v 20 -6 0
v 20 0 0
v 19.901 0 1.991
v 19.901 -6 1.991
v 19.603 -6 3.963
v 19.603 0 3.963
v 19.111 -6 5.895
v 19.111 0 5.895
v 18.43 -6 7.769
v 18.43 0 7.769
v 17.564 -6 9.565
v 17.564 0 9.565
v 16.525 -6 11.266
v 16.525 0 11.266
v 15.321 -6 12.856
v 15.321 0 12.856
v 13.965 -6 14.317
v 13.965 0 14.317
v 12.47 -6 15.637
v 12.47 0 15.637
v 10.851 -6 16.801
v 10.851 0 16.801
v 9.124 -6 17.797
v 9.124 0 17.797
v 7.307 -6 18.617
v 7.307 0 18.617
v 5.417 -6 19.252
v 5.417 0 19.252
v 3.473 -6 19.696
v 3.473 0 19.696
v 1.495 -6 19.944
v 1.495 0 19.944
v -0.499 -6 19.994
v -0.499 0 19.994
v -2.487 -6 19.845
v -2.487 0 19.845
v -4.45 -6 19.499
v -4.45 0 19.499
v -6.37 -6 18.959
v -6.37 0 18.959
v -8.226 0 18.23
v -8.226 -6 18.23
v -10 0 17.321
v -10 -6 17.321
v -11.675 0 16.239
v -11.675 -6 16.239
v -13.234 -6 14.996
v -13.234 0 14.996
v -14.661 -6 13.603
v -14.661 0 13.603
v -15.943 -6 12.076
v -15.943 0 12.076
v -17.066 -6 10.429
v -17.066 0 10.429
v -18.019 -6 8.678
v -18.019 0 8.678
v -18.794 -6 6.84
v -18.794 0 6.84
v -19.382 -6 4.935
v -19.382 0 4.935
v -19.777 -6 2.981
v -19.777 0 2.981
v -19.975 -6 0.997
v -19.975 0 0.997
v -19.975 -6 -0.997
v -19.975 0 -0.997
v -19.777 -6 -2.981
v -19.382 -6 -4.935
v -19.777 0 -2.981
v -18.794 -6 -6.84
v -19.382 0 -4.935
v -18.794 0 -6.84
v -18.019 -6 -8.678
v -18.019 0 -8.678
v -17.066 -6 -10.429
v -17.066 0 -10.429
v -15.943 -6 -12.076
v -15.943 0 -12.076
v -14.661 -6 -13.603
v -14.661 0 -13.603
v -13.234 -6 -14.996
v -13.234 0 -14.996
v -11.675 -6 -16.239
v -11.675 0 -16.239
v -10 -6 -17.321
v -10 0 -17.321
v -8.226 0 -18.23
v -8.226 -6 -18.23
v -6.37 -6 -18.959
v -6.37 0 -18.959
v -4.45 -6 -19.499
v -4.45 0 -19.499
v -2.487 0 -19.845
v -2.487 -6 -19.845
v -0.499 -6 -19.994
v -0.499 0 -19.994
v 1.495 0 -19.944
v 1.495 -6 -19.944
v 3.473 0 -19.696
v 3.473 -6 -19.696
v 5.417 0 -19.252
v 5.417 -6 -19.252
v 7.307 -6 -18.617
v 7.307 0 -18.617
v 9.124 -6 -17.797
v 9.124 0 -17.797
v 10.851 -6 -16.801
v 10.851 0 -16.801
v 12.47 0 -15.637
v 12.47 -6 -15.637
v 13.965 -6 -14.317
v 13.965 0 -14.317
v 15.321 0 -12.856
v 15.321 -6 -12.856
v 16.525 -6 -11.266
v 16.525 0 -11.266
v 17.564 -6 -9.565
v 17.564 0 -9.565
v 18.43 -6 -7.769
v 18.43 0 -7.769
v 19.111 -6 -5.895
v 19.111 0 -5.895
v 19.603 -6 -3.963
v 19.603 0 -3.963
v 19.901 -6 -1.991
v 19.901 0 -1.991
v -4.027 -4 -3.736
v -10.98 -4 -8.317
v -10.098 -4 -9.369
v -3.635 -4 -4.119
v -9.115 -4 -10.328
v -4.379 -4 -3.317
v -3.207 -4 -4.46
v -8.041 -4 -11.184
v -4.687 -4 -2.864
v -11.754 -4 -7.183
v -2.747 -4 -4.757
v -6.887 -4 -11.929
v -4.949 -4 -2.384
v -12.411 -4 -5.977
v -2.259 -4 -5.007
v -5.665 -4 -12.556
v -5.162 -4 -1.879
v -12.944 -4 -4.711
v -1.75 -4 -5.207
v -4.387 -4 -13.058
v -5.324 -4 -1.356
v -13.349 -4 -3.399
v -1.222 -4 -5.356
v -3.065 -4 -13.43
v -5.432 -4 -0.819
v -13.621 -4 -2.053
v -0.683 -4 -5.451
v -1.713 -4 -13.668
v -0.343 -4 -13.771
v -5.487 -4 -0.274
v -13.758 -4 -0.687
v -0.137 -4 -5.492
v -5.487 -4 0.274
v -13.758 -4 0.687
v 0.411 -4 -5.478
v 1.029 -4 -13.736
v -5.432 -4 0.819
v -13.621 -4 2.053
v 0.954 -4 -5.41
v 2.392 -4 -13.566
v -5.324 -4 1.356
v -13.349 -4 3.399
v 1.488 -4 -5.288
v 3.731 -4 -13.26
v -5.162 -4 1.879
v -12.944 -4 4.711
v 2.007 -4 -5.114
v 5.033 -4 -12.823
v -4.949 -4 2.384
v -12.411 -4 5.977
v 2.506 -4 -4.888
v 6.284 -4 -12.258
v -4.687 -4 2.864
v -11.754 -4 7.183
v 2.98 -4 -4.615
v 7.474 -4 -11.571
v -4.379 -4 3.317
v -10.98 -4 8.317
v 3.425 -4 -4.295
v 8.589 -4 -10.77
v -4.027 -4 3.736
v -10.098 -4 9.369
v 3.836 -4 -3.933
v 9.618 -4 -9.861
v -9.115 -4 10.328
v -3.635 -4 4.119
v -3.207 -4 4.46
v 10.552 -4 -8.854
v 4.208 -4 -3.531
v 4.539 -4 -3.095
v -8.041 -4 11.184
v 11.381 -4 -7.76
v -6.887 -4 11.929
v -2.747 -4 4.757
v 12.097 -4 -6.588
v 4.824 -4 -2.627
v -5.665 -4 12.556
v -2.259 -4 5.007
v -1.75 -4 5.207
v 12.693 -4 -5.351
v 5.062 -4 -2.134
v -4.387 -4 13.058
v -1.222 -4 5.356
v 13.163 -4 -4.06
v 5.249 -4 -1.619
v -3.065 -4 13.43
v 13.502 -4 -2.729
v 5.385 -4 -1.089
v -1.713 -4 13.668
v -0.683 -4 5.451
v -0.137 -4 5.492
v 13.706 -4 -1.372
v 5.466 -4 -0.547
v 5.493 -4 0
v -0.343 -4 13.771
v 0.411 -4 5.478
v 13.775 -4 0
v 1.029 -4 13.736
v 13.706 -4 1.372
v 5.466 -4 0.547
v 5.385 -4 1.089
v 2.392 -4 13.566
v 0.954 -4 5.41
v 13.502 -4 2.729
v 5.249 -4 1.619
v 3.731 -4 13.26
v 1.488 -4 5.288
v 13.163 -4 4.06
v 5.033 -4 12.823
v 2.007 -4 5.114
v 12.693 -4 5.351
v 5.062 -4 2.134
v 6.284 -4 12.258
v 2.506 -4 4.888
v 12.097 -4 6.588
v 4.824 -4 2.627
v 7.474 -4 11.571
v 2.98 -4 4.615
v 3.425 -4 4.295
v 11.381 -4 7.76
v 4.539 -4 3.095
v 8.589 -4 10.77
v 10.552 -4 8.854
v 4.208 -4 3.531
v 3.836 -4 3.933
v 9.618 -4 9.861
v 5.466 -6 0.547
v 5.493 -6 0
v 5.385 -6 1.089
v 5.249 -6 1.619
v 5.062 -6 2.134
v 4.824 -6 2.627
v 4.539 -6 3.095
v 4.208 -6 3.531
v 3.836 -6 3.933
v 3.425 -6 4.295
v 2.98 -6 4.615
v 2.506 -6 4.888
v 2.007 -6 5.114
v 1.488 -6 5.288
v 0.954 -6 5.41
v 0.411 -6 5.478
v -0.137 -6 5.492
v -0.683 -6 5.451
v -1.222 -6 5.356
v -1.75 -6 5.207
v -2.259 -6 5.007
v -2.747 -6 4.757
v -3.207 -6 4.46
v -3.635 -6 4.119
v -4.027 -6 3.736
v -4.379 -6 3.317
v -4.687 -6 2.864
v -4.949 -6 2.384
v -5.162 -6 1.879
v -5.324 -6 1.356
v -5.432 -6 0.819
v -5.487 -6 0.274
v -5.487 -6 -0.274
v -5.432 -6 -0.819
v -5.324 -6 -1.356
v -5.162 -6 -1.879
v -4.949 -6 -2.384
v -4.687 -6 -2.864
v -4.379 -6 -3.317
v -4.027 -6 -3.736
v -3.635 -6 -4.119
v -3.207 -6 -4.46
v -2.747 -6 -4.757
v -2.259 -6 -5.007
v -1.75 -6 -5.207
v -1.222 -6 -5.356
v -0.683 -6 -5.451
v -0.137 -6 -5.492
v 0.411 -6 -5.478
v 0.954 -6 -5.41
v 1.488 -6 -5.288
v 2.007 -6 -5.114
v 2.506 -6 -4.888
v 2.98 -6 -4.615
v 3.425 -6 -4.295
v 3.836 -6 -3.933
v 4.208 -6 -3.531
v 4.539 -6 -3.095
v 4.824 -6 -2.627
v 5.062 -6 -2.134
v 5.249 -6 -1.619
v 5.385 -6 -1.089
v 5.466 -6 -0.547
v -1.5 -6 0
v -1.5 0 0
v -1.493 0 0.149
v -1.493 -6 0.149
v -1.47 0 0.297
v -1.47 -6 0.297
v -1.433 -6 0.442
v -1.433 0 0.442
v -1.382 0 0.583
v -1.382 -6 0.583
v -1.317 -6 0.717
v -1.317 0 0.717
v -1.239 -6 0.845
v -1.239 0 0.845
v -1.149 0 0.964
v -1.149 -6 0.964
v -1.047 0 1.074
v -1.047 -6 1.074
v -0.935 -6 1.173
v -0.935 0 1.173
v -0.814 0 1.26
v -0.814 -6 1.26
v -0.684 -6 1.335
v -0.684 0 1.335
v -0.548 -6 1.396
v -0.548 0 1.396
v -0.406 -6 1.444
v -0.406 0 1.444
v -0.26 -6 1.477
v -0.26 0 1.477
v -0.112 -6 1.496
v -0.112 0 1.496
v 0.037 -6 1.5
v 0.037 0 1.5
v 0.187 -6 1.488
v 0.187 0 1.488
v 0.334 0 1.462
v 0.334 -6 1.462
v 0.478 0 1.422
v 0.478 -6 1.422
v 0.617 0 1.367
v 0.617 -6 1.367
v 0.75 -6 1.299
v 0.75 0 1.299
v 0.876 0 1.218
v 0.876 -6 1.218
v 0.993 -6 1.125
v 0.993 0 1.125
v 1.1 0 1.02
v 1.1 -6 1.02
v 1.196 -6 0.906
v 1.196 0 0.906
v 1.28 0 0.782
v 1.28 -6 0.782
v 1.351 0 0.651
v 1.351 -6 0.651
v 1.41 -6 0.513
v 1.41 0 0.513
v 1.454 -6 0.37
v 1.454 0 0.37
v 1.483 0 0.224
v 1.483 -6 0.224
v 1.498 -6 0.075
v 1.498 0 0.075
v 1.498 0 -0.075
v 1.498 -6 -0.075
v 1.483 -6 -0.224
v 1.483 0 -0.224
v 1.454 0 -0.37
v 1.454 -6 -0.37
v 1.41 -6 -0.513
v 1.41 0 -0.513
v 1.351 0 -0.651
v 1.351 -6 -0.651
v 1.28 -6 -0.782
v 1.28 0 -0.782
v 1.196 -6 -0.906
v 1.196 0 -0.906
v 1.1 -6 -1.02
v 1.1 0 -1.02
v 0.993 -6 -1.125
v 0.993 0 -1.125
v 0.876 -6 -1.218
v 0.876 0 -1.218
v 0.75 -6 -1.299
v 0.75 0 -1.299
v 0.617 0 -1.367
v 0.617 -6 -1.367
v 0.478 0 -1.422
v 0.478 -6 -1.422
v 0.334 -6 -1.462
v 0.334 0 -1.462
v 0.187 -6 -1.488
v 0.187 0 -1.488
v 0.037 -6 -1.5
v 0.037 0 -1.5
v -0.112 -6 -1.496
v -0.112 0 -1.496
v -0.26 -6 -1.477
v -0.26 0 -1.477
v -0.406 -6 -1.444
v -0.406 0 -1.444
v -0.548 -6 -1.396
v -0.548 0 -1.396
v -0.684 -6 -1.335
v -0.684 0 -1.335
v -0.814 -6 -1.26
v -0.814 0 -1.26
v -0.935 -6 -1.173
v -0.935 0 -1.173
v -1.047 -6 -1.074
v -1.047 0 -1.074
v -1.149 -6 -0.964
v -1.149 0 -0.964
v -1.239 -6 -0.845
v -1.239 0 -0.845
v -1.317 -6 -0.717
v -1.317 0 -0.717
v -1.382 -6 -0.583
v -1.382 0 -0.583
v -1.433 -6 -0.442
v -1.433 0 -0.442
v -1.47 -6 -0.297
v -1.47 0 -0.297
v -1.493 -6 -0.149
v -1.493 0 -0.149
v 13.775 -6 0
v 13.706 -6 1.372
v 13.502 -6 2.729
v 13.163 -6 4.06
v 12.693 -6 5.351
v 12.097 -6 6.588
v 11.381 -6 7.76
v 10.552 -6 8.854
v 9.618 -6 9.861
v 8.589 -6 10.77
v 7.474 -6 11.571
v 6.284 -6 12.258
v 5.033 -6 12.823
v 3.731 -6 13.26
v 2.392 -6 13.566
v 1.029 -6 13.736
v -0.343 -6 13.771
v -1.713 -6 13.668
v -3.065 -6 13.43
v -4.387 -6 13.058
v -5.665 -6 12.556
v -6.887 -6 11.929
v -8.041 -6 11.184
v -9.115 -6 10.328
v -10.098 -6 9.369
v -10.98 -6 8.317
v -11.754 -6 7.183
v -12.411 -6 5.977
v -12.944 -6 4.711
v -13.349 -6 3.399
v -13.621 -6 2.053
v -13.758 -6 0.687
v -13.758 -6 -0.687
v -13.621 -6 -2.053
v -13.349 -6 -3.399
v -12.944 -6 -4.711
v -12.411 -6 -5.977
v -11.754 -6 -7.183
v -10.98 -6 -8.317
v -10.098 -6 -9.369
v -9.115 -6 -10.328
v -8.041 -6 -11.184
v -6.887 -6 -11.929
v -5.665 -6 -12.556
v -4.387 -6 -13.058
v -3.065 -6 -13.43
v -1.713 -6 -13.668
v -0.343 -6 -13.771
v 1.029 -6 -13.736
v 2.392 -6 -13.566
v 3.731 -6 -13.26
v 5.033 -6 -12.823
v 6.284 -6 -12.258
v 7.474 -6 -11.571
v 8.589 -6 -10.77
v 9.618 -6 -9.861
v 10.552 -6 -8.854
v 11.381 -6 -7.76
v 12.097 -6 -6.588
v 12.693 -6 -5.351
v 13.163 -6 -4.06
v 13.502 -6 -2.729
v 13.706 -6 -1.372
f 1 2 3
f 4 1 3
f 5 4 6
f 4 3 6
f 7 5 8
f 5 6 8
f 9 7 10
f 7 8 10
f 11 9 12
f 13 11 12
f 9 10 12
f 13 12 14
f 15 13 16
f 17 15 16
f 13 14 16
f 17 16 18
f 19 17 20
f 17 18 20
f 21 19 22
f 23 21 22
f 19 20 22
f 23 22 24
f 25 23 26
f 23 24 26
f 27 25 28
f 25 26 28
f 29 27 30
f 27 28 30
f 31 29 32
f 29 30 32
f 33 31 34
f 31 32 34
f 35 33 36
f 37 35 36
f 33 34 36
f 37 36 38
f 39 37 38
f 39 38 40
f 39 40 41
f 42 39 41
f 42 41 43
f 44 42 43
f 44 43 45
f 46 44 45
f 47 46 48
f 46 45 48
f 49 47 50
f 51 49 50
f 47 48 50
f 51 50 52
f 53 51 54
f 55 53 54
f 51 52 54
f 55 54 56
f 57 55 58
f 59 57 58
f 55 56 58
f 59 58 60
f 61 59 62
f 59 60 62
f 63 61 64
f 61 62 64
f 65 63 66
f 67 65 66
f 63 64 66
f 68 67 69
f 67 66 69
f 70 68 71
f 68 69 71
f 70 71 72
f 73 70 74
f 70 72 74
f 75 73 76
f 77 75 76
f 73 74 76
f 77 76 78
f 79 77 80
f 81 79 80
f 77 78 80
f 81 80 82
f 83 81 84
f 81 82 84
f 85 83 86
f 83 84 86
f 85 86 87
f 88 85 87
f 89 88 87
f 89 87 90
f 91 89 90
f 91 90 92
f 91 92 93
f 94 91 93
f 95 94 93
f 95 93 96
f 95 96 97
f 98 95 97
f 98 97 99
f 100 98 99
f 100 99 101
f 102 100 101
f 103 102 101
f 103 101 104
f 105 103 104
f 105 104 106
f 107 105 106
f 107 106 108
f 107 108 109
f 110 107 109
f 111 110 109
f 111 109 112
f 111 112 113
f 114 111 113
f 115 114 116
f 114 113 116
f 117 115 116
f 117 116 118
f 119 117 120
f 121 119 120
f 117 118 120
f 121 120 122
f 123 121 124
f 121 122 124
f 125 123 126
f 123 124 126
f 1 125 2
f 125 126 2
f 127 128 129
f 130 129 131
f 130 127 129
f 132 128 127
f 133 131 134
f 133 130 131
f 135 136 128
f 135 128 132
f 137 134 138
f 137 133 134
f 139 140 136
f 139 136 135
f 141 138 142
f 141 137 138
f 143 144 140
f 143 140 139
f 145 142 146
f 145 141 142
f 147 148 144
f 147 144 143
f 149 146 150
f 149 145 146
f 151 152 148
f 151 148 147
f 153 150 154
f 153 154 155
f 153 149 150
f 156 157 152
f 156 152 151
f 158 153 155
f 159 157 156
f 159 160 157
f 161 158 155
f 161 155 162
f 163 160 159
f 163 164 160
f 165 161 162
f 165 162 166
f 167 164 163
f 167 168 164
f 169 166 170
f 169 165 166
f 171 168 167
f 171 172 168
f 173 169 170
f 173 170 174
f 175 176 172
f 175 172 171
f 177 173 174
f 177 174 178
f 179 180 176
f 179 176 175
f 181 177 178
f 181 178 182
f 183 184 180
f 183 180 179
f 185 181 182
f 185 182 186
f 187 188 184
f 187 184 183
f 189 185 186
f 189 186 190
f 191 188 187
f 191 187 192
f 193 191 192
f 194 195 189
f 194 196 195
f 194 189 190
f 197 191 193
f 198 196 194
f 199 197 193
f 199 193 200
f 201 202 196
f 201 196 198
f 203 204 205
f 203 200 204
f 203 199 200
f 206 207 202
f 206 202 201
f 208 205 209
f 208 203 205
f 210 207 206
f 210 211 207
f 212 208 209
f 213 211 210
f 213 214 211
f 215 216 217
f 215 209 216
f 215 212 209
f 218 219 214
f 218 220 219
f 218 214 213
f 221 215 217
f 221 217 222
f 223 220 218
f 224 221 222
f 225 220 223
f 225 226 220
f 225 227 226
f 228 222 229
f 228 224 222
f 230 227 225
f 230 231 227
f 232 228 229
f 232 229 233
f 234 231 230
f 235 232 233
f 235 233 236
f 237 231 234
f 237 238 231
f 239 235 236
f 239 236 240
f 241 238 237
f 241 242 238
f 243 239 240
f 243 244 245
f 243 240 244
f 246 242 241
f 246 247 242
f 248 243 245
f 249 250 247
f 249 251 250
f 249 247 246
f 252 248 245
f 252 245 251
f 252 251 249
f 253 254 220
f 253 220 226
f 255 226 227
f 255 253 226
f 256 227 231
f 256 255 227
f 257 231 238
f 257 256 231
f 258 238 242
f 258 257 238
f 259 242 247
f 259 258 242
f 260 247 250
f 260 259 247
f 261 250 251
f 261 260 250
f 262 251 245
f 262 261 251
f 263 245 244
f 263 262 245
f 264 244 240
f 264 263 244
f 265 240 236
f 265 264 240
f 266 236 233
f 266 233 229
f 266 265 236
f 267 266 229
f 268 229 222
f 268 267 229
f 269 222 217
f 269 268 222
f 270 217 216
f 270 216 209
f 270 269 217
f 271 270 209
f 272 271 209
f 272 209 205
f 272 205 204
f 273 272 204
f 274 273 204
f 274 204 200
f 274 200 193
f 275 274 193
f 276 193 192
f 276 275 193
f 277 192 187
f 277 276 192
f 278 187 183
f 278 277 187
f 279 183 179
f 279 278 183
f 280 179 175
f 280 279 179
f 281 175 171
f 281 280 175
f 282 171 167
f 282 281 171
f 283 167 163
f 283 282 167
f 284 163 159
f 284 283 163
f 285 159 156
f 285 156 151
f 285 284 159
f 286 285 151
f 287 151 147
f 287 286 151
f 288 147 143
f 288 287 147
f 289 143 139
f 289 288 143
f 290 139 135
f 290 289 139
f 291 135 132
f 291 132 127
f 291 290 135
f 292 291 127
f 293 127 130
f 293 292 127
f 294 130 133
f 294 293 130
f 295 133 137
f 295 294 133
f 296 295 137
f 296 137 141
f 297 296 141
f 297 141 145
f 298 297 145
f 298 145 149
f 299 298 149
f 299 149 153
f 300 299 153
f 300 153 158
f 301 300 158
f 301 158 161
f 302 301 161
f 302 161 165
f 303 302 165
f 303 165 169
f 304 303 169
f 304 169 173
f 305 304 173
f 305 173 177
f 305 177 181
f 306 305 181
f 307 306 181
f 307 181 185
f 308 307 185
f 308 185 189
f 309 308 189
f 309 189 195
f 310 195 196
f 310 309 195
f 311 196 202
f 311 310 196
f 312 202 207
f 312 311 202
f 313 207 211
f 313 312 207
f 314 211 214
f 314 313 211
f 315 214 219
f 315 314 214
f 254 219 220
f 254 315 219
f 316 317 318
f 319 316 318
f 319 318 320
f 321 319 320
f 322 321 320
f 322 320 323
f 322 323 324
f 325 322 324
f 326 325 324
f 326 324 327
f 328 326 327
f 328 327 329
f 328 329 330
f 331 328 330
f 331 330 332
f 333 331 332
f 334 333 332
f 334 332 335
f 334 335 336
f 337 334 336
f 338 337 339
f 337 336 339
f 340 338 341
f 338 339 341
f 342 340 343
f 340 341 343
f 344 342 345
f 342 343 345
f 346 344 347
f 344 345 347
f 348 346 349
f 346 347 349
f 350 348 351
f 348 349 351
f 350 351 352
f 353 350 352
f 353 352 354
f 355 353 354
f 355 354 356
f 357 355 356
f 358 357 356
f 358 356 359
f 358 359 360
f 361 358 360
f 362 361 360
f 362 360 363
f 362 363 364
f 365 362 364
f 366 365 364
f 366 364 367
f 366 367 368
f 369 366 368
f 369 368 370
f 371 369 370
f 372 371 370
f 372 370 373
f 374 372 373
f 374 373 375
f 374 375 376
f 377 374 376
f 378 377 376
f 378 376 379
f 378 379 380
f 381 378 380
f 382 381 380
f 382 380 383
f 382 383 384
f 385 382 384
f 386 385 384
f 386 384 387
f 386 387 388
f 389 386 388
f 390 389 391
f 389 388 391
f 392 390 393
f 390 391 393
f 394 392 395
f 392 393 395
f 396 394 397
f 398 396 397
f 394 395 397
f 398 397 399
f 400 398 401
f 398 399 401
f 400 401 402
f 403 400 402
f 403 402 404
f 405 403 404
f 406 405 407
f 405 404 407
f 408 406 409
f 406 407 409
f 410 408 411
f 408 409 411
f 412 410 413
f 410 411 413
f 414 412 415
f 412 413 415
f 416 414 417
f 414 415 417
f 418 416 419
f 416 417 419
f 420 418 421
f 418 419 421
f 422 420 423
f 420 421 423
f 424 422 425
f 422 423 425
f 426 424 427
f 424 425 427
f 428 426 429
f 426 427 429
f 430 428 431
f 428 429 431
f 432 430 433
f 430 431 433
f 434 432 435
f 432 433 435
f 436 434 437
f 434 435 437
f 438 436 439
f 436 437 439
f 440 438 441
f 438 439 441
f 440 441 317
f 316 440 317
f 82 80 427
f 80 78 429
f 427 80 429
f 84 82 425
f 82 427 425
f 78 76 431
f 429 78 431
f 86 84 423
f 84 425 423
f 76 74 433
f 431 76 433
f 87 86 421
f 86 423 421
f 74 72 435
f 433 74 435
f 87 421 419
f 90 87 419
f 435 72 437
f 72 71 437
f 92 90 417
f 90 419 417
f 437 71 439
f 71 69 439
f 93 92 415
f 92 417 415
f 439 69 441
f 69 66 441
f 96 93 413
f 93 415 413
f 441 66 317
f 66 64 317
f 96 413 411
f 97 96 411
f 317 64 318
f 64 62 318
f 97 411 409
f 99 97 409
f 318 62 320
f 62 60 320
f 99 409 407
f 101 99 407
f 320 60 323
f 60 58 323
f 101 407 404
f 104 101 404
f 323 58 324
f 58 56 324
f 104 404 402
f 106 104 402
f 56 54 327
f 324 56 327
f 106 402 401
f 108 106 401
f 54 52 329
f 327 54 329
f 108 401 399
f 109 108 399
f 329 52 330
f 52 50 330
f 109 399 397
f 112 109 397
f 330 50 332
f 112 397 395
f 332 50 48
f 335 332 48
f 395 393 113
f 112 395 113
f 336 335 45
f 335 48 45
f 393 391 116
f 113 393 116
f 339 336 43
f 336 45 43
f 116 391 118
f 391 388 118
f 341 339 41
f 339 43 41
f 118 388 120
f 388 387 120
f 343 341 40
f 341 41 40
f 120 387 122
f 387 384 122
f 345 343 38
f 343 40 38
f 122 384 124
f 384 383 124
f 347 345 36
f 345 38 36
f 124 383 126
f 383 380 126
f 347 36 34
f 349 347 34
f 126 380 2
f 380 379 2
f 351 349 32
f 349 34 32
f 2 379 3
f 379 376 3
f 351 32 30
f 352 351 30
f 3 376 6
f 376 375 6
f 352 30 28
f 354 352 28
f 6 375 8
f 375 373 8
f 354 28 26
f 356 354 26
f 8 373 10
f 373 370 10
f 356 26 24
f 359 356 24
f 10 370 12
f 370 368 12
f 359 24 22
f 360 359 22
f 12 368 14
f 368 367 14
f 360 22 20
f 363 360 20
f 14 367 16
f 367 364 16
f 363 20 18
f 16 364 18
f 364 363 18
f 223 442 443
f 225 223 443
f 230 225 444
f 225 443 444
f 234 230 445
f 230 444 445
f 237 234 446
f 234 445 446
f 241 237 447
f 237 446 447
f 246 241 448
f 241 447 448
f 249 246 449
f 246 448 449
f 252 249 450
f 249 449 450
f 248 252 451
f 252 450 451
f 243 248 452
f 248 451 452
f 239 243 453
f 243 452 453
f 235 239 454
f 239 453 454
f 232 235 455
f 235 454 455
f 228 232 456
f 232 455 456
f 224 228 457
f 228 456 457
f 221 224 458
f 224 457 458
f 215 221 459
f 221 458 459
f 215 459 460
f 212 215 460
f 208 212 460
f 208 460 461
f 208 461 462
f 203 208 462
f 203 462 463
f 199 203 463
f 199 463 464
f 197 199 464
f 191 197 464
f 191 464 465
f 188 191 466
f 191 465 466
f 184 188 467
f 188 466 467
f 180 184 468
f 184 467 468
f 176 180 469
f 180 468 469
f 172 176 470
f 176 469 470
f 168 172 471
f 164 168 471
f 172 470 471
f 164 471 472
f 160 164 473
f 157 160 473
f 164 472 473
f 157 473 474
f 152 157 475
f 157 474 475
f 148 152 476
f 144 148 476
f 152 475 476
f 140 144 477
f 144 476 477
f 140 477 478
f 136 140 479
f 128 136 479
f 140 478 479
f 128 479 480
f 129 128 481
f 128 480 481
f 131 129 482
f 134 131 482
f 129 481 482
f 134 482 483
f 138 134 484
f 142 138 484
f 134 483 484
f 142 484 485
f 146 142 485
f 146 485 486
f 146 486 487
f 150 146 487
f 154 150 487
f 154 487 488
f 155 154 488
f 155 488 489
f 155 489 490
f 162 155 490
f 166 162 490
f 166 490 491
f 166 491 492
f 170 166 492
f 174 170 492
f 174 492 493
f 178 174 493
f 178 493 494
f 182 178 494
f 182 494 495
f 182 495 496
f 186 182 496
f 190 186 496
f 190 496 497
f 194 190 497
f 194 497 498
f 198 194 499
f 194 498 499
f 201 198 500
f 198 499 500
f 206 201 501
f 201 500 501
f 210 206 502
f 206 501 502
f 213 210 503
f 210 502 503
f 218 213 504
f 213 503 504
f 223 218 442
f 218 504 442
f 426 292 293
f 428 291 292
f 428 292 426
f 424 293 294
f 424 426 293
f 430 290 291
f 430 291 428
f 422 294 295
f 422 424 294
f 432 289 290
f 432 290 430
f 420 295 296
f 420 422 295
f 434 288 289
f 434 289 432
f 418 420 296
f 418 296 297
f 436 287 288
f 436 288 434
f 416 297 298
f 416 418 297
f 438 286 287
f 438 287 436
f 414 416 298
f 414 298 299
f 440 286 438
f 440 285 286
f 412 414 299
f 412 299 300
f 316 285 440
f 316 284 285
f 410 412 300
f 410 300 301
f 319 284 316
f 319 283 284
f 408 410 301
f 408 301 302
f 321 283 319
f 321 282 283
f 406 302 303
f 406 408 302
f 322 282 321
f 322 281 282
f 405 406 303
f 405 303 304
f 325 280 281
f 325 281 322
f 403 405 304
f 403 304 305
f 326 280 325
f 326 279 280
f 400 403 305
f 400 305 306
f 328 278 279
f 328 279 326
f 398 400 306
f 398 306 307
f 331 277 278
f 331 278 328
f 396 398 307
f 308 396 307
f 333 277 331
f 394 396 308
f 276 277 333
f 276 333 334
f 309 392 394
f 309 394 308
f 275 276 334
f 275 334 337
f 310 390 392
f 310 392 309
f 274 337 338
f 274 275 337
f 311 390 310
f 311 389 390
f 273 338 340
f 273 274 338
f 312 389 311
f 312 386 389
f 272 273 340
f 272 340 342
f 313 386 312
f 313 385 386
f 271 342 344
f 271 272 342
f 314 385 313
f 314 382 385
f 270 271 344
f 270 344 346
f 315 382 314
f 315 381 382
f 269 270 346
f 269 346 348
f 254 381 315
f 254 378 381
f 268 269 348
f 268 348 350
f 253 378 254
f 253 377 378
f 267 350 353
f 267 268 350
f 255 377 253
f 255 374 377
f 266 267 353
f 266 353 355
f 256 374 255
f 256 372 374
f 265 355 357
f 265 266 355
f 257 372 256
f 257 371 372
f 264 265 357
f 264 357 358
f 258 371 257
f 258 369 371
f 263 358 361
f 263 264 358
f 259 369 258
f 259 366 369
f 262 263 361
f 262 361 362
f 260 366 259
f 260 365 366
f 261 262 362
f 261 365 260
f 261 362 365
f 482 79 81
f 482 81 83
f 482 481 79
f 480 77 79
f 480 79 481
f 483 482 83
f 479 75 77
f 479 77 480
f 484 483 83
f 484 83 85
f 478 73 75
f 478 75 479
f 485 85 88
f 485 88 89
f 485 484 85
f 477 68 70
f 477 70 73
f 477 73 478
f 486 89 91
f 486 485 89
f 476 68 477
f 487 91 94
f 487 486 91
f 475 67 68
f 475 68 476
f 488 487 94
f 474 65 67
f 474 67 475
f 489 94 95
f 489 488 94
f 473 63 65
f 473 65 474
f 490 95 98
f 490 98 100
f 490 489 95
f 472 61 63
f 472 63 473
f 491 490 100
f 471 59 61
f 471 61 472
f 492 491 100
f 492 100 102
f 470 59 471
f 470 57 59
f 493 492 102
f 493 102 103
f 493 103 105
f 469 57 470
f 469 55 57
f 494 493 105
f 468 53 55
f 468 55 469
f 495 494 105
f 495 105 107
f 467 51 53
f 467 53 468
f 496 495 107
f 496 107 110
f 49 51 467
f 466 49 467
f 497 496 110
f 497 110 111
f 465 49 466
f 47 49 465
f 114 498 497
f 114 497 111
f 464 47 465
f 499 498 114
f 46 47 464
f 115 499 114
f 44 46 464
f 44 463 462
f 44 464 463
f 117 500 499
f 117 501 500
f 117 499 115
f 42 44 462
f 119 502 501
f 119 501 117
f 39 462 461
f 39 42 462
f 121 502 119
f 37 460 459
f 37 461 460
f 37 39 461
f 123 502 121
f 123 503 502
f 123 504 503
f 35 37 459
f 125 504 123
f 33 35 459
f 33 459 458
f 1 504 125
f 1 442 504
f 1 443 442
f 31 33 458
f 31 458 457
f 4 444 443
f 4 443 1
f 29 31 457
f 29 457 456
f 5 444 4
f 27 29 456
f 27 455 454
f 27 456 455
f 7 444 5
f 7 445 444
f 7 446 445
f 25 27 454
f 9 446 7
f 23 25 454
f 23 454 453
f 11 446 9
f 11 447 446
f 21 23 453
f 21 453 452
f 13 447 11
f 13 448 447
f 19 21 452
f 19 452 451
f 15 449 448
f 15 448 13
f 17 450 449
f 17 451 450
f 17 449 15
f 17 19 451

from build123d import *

# Parameters (mm, degrees)
F0_R     = 20
F1_DEPTH = 6
F2_R     = 13.774889
F2_R_2   = 5.493426
F3_DEPTH = 2
F4_D     = 3


with BuildPart() as f1:
    # F0 (on Front) → F1 (new body)
    with BuildSketch(Plane.XZ):
        Circle(F0_R)
    extrude(amount=F1_DEPTH)

    # F2 (on face) → F3 (cut)
    with BuildSketch(Plane.XZ.offset(6)):
        Circle(F2_R)
        Circle(F2_R_2, mode=Mode.SUBTRACT)
    extrude(amount=-F3_DEPTH, mode=Mode.SUBTRACT)

    # F4 (through all)
    with Locations(Plane.XZ.offset(6)):
        with Locations((0, 0)):
            Hole(F4_D / 2)


solid = f1.part
